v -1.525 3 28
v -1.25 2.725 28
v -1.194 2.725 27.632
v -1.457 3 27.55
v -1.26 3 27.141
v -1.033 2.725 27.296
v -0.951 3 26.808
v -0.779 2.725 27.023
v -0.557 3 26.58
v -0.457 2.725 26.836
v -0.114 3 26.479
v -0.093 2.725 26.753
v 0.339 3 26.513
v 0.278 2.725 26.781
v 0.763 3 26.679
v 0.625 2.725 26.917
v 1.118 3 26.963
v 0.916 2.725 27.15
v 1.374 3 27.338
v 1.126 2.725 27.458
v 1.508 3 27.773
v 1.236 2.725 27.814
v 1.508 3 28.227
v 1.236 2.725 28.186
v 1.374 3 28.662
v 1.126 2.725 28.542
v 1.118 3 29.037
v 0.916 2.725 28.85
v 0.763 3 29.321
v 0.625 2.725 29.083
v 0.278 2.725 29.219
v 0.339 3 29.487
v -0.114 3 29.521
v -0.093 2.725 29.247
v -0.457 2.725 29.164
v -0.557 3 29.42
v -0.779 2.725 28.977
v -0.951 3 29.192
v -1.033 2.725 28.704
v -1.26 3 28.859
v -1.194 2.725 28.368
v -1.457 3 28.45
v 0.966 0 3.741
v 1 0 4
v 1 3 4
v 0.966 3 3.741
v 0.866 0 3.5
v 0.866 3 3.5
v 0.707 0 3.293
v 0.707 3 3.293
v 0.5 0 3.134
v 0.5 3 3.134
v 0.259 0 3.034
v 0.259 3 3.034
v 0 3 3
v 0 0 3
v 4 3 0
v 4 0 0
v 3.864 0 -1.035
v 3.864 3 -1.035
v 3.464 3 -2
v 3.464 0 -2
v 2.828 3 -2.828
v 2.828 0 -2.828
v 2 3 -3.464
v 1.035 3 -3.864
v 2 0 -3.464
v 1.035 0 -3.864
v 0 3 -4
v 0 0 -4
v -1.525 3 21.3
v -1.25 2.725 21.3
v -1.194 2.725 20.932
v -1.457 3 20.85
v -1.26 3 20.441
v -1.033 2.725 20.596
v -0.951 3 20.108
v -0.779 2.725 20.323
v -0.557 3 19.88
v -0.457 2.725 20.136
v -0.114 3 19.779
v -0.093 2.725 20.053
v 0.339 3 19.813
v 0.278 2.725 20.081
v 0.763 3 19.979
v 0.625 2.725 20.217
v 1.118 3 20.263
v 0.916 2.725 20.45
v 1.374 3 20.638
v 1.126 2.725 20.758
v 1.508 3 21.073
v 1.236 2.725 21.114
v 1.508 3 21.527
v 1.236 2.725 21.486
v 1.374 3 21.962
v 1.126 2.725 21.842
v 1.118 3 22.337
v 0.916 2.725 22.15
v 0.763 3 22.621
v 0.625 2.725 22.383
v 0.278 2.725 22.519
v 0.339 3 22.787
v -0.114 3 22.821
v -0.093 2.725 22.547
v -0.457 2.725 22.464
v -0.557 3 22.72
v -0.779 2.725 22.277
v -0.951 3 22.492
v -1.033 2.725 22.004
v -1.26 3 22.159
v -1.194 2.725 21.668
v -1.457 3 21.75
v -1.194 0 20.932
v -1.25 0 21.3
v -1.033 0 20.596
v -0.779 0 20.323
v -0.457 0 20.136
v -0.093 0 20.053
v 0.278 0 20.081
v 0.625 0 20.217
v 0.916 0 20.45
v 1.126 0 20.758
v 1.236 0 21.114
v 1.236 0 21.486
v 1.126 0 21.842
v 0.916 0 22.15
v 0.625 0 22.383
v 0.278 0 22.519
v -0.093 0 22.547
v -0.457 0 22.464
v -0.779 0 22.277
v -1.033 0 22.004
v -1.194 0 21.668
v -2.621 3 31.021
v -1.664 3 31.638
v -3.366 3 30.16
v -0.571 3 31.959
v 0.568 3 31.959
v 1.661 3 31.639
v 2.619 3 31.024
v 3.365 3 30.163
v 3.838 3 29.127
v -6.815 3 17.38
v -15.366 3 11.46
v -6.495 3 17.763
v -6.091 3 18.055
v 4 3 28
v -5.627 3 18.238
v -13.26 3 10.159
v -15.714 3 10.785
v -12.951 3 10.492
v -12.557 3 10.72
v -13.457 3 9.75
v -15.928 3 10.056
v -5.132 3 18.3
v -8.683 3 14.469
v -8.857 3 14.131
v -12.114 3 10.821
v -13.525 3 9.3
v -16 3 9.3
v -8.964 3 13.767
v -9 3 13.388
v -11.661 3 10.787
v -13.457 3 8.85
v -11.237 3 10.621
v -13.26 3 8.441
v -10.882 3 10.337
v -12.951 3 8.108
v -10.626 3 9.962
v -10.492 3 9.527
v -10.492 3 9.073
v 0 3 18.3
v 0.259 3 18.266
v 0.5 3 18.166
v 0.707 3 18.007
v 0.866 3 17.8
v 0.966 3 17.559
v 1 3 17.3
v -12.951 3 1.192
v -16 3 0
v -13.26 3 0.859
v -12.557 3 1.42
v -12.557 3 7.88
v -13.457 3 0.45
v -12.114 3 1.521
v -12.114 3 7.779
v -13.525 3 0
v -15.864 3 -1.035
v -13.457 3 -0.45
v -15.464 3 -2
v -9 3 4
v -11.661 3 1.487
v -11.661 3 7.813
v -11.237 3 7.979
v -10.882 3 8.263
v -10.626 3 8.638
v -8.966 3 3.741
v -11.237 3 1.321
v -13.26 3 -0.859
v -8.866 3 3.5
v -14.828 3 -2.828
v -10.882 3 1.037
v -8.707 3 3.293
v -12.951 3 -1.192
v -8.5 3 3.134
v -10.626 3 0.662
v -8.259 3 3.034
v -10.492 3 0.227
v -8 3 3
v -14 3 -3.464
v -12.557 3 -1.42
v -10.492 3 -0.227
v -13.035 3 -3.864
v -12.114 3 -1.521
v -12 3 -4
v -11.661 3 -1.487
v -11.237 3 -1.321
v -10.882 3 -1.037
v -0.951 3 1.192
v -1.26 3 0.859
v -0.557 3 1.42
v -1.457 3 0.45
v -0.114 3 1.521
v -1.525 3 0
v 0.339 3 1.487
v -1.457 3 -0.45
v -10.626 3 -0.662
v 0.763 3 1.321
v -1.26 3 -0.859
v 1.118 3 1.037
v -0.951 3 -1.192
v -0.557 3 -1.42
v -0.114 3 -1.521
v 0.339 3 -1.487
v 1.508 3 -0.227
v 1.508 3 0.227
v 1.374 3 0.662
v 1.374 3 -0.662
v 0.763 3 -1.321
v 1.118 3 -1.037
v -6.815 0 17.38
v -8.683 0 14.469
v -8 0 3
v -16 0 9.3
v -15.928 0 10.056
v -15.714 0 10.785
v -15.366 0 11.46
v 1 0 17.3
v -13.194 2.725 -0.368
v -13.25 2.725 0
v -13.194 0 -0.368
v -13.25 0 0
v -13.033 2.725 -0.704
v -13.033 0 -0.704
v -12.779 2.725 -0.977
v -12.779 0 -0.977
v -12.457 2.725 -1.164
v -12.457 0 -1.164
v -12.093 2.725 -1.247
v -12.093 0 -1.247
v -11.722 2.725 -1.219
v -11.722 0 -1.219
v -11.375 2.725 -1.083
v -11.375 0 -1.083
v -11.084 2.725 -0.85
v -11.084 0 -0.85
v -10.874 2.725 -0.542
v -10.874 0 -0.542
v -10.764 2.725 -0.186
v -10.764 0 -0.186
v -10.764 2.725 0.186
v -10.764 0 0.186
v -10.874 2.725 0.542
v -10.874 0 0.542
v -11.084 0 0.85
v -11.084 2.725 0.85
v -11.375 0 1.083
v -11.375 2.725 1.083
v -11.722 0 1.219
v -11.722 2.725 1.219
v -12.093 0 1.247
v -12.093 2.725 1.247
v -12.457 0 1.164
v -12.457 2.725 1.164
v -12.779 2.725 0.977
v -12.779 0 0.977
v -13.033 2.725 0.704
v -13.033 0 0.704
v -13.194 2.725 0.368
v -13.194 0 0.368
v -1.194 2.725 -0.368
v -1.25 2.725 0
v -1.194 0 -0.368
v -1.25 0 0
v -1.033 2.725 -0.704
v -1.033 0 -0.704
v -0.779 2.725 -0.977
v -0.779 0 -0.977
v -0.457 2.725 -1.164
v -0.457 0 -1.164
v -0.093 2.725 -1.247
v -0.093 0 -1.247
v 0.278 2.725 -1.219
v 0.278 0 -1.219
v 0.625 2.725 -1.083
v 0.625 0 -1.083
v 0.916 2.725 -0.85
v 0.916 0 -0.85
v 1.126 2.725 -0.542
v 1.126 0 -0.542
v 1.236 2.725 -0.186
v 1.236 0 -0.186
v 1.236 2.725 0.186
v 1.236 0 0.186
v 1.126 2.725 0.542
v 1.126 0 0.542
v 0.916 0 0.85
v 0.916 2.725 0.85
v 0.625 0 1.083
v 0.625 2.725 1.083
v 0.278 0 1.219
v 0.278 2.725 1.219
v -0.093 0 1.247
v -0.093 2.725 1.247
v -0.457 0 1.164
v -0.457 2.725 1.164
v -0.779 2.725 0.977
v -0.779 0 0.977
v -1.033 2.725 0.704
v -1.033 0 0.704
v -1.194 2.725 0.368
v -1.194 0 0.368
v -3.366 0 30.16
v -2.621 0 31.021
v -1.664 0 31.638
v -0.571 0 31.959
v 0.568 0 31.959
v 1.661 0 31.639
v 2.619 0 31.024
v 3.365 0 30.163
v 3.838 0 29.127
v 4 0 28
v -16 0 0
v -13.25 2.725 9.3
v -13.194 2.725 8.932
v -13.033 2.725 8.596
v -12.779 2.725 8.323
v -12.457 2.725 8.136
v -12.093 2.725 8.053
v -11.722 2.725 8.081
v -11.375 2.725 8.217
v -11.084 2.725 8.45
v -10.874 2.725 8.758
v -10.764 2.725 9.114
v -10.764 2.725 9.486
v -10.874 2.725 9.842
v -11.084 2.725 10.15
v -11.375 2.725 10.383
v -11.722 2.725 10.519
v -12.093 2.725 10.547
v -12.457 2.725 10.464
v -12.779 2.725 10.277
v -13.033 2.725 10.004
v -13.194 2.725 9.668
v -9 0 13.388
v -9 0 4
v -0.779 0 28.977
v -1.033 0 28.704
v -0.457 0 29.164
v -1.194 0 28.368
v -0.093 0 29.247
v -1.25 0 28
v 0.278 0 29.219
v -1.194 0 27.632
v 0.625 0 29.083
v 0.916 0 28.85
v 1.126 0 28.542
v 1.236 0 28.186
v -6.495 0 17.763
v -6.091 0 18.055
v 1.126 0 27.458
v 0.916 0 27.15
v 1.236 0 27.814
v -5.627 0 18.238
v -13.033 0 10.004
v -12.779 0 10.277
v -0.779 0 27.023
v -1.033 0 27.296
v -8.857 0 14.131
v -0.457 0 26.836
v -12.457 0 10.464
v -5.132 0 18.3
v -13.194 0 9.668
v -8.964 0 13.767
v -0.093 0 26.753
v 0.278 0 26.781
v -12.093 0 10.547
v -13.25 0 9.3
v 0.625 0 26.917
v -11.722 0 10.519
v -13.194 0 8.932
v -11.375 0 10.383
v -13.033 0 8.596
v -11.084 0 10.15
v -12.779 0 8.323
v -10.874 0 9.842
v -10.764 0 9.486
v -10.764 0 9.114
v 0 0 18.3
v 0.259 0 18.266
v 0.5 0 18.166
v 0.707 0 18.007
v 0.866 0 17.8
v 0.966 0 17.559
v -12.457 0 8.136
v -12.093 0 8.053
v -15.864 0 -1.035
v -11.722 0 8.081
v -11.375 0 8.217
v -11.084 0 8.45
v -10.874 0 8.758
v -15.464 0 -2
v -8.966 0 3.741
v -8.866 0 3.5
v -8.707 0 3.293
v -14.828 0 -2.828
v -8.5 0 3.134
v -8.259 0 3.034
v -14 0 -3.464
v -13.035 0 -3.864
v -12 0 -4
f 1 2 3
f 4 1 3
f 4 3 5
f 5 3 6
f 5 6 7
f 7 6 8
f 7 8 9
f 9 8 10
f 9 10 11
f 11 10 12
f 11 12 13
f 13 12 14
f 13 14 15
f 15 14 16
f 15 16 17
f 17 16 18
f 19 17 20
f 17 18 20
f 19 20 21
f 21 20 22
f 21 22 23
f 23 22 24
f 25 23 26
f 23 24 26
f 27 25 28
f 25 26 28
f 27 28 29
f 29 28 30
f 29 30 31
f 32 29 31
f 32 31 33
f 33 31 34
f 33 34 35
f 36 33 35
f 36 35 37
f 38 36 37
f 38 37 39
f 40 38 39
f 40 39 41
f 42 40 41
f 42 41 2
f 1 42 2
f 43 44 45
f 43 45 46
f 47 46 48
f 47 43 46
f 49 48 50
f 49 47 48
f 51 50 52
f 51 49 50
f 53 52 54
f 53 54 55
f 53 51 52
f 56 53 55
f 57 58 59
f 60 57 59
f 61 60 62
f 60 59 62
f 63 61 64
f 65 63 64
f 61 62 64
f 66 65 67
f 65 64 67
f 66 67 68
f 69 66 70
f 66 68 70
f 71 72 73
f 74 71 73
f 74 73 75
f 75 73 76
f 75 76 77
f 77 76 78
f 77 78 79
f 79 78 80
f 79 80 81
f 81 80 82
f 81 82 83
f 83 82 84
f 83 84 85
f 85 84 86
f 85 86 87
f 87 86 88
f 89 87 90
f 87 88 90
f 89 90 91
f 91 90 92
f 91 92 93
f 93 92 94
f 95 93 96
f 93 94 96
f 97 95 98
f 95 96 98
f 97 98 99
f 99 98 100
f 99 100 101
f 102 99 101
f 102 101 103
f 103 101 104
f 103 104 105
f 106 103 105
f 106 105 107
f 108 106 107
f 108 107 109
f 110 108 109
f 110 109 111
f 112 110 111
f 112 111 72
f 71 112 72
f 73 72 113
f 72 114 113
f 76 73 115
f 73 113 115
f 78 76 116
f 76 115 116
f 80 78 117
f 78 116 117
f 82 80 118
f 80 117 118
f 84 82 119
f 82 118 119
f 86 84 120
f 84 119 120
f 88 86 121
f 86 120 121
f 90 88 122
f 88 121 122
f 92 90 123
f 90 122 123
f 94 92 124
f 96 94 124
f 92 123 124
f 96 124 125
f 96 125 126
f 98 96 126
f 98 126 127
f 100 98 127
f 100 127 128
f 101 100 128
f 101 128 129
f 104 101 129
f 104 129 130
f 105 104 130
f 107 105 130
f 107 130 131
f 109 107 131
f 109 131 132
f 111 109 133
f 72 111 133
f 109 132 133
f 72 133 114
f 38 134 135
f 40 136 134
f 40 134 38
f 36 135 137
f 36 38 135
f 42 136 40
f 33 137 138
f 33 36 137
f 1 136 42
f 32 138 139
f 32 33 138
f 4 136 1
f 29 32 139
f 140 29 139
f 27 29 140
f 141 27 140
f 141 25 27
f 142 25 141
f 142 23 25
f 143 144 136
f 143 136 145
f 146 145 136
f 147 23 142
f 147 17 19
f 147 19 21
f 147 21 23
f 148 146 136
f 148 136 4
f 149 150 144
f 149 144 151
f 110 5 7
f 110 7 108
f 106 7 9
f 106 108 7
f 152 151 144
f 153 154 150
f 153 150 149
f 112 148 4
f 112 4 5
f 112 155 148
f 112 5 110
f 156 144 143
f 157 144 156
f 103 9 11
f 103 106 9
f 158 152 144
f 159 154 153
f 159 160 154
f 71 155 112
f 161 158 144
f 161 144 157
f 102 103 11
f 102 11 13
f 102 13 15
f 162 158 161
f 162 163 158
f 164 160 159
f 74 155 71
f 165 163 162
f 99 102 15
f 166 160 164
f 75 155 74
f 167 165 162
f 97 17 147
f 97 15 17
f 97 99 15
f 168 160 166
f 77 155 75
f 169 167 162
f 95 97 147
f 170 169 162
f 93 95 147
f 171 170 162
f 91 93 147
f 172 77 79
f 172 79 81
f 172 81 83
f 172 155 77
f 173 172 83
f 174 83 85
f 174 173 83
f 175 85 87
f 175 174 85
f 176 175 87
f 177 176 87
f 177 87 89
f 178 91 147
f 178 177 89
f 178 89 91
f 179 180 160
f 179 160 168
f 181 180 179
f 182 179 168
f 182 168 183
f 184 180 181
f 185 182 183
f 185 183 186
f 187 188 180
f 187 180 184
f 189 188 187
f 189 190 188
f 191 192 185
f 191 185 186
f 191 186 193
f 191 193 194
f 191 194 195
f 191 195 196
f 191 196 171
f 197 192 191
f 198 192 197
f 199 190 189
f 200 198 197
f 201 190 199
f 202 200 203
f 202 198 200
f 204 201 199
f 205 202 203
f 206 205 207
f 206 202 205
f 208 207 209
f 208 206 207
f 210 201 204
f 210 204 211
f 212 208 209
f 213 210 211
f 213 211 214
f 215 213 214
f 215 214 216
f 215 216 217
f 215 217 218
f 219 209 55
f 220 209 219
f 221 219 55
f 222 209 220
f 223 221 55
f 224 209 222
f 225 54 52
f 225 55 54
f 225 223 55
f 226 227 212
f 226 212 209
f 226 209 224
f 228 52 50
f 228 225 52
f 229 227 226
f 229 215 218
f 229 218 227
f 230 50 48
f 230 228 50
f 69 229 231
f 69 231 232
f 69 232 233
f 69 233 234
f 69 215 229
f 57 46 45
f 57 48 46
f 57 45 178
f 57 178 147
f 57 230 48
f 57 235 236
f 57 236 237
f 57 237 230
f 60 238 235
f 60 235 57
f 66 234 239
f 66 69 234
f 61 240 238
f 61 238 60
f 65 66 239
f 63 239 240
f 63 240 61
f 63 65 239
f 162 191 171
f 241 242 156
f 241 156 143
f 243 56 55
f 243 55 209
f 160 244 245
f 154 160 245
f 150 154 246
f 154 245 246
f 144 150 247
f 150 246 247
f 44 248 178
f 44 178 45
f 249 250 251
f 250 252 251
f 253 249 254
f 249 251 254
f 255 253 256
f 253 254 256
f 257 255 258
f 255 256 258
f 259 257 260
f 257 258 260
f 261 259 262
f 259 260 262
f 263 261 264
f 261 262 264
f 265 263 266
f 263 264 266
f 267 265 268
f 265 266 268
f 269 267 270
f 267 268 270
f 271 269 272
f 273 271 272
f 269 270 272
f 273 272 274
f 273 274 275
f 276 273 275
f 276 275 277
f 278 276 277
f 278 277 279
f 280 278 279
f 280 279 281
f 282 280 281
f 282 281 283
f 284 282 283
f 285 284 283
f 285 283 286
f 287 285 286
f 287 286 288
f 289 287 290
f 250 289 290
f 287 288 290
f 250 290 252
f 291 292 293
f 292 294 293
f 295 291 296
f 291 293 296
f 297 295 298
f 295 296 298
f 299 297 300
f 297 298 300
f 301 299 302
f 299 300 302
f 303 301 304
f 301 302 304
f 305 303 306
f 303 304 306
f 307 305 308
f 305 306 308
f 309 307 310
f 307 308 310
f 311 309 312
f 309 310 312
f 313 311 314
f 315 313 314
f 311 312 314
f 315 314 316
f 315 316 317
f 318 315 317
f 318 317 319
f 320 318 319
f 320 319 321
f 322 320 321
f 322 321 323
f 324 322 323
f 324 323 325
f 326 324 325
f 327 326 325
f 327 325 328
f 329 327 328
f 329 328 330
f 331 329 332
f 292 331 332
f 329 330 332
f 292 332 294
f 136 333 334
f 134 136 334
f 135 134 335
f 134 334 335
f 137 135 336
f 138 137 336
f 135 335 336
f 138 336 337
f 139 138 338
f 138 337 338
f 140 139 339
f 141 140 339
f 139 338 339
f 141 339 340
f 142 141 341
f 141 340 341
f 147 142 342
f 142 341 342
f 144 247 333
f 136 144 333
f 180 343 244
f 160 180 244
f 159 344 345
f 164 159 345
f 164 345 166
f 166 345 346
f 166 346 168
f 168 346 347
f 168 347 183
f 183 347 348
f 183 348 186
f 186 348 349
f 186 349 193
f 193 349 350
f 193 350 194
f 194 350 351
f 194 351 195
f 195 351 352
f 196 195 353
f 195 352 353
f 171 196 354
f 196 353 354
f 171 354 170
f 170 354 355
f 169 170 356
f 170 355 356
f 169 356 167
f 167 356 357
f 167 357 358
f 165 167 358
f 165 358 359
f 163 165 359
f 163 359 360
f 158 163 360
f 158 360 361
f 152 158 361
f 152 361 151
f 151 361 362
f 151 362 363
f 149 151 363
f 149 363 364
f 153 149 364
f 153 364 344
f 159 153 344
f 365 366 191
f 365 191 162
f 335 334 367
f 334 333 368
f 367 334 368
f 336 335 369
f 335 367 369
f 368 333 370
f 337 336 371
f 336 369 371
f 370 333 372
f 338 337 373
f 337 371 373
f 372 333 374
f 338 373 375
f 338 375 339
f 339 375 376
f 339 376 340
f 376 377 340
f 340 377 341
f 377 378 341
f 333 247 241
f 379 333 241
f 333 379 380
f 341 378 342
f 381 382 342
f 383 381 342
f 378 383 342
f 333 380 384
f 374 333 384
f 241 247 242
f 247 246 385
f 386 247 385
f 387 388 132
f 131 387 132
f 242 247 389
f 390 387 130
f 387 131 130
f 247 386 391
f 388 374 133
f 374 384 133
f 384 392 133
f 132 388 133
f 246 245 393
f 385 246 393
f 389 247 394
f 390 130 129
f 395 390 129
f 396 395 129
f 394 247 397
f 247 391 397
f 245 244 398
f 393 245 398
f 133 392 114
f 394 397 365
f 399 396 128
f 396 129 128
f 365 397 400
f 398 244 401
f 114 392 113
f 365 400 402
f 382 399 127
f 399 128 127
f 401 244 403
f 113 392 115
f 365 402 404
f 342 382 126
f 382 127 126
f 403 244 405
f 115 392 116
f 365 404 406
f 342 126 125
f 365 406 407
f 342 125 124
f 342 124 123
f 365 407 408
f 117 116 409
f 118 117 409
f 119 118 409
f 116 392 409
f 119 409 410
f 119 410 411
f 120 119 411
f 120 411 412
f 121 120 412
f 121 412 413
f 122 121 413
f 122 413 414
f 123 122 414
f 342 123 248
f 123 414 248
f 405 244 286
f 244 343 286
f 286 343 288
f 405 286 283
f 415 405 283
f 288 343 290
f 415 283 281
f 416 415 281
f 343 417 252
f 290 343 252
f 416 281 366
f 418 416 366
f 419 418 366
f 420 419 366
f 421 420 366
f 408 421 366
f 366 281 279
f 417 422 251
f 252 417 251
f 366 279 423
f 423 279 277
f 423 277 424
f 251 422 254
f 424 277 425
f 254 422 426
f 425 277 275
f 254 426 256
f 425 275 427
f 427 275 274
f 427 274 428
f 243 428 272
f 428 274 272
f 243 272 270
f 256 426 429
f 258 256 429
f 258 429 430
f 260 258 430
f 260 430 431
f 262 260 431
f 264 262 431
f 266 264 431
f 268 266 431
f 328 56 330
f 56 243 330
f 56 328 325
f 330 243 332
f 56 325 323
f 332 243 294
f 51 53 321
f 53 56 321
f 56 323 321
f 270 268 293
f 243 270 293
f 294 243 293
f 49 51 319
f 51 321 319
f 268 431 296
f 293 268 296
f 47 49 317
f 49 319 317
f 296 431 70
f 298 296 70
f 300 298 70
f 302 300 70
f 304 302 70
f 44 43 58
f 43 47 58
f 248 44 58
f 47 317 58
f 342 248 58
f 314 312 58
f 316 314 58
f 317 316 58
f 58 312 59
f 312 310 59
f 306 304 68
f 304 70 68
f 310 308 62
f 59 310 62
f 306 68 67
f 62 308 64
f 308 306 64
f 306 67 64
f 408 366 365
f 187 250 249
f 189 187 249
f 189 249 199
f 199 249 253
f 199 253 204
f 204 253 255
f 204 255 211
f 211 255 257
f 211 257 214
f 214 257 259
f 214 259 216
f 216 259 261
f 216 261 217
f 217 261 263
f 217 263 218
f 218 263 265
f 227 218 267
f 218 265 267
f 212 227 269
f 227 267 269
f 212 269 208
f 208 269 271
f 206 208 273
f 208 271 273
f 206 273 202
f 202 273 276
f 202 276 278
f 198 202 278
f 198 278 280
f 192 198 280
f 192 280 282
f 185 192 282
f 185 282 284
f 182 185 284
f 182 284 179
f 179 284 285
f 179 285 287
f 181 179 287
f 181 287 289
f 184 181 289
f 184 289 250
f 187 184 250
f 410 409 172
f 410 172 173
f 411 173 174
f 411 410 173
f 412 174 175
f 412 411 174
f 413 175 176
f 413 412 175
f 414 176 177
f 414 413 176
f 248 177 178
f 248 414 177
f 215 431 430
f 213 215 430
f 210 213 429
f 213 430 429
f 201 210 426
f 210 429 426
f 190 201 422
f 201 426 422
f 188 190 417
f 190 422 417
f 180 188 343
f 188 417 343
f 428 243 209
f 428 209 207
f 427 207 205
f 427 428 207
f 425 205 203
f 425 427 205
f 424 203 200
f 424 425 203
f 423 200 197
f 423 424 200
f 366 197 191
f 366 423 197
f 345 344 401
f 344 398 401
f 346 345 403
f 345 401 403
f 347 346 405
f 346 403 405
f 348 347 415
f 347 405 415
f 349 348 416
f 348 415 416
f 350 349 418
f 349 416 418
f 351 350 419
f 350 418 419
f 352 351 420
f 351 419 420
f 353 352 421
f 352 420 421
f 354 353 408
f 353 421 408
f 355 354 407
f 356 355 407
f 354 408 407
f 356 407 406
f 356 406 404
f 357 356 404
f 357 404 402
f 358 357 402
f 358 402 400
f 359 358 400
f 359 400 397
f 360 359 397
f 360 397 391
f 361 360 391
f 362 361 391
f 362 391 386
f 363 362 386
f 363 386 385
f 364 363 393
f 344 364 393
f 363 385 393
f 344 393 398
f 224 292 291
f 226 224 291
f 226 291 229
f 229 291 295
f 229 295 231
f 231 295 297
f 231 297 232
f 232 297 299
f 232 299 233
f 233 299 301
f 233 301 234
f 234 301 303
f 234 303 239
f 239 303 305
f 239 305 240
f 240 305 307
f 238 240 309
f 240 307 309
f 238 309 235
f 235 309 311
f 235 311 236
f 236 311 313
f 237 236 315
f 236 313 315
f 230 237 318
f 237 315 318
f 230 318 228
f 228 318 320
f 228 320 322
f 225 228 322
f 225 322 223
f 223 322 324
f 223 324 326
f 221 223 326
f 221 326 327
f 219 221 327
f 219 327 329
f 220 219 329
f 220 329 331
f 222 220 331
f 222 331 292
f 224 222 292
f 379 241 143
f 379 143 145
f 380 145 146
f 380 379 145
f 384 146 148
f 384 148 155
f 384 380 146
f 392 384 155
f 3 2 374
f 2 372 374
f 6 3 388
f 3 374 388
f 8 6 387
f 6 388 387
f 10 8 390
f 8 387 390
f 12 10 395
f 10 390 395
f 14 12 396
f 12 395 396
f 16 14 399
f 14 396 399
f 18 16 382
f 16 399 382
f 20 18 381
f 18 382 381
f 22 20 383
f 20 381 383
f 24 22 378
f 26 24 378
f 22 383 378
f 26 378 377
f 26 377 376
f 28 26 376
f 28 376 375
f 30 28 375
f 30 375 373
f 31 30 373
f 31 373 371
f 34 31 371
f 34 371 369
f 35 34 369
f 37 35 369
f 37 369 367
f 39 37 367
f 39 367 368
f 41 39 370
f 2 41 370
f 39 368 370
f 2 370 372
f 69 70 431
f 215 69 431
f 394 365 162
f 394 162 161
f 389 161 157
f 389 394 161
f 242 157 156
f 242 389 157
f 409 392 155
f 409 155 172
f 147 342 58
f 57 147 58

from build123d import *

# Parameters (mm, degrees)
EXTRUDE_1_DEPTH              = 3
HOLE_WIZARD_M3_1_D           = 2.5
HOLE_WIZARD_M3_1_CSINK_D     = 3.05
HOLE_WIZARD_M3_1_CSINK_ANGLE = 90


with BuildPart() as part:
    # 草图1 → 凸台-拉伸1 (new body)
    with BuildSketch(Plane(origin=(0, 0, 0), x_dir=(1, 0, 0), z_dir=(0, 1, 0))):
        with BuildLine():
            Line((4, -28), (4, 0))
            ThreePointArc((4, 0), (2.828427125, 2.828427125), (0, 4))
            Line((0, 4), (-12, 4))
            ThreePointArc((-12, 4), (-14.828427125, 2.828427125), (-16, 0))
            Line((-16, 0), (-16, -9.3))
            ThreePointArc((-16, -9.3), (-15.83835057, -10.425639773), (-15.366467551, -11.460300033))
            Line((-15.366467551, -11.460300033), (-3.366467551, -30.160300033))
            ThreePointArc((-3.366467551, -30.160300033), (1.125639773, -31.83835057), (4, -28))
        make_face()
        with BuildLine():
            Line((-8.683233775, -14.468627367), (-6.814876995, -17.380150016))
            ThreePointArc((-6.814876995, -17.380150016), (-6.09073132, -18.055035617), (-5.13164322, -18.3))
            Line((-5.13164322, -18.3), (0, -18.3))
            ThreePointArc((0, -18.3), (0.707106781, -18.007106781), (1, -17.3))
            Line((1, -17.3), (1, -4))
            ThreePointArc((1, -4), (0.707106781, -3.292893219), (0, -3))
            Line((0, -3), (-8, -3))
            ThreePointArc((-8, -3), (-8.707106781, -3.292893219), (-9, -4))
            Line((-9, -4), (-9, -13.388477351))
            ThreePointArc((-9, -13.388477351), (-8.919175285, -13.951297237), (-8.683233775, -14.468627367))
        make_face(mode=Mode.SUBTRACT)
    extrude(amount=EXTRUDE_1_DEPTH)

    # M3 螺纹孔1 (through all)
    with Locations(Plane(origin=(0, 3, 0), x_dir=(1, 0, 0), z_dir=(0, 1, 0))):
        with Locations((-12, 0), (-12, -9.3), (0, 0), (0, -21.3), (0, -28)):
            CounterSinkHole(HOLE_WIZARD_M3_1_D / 2, HOLE_WIZARD_M3_1_CSINK_D / 2, counter_sink_angle=HOLE_WIZARD_M3_1_CSINK_ANGLE)


solid = part.part
